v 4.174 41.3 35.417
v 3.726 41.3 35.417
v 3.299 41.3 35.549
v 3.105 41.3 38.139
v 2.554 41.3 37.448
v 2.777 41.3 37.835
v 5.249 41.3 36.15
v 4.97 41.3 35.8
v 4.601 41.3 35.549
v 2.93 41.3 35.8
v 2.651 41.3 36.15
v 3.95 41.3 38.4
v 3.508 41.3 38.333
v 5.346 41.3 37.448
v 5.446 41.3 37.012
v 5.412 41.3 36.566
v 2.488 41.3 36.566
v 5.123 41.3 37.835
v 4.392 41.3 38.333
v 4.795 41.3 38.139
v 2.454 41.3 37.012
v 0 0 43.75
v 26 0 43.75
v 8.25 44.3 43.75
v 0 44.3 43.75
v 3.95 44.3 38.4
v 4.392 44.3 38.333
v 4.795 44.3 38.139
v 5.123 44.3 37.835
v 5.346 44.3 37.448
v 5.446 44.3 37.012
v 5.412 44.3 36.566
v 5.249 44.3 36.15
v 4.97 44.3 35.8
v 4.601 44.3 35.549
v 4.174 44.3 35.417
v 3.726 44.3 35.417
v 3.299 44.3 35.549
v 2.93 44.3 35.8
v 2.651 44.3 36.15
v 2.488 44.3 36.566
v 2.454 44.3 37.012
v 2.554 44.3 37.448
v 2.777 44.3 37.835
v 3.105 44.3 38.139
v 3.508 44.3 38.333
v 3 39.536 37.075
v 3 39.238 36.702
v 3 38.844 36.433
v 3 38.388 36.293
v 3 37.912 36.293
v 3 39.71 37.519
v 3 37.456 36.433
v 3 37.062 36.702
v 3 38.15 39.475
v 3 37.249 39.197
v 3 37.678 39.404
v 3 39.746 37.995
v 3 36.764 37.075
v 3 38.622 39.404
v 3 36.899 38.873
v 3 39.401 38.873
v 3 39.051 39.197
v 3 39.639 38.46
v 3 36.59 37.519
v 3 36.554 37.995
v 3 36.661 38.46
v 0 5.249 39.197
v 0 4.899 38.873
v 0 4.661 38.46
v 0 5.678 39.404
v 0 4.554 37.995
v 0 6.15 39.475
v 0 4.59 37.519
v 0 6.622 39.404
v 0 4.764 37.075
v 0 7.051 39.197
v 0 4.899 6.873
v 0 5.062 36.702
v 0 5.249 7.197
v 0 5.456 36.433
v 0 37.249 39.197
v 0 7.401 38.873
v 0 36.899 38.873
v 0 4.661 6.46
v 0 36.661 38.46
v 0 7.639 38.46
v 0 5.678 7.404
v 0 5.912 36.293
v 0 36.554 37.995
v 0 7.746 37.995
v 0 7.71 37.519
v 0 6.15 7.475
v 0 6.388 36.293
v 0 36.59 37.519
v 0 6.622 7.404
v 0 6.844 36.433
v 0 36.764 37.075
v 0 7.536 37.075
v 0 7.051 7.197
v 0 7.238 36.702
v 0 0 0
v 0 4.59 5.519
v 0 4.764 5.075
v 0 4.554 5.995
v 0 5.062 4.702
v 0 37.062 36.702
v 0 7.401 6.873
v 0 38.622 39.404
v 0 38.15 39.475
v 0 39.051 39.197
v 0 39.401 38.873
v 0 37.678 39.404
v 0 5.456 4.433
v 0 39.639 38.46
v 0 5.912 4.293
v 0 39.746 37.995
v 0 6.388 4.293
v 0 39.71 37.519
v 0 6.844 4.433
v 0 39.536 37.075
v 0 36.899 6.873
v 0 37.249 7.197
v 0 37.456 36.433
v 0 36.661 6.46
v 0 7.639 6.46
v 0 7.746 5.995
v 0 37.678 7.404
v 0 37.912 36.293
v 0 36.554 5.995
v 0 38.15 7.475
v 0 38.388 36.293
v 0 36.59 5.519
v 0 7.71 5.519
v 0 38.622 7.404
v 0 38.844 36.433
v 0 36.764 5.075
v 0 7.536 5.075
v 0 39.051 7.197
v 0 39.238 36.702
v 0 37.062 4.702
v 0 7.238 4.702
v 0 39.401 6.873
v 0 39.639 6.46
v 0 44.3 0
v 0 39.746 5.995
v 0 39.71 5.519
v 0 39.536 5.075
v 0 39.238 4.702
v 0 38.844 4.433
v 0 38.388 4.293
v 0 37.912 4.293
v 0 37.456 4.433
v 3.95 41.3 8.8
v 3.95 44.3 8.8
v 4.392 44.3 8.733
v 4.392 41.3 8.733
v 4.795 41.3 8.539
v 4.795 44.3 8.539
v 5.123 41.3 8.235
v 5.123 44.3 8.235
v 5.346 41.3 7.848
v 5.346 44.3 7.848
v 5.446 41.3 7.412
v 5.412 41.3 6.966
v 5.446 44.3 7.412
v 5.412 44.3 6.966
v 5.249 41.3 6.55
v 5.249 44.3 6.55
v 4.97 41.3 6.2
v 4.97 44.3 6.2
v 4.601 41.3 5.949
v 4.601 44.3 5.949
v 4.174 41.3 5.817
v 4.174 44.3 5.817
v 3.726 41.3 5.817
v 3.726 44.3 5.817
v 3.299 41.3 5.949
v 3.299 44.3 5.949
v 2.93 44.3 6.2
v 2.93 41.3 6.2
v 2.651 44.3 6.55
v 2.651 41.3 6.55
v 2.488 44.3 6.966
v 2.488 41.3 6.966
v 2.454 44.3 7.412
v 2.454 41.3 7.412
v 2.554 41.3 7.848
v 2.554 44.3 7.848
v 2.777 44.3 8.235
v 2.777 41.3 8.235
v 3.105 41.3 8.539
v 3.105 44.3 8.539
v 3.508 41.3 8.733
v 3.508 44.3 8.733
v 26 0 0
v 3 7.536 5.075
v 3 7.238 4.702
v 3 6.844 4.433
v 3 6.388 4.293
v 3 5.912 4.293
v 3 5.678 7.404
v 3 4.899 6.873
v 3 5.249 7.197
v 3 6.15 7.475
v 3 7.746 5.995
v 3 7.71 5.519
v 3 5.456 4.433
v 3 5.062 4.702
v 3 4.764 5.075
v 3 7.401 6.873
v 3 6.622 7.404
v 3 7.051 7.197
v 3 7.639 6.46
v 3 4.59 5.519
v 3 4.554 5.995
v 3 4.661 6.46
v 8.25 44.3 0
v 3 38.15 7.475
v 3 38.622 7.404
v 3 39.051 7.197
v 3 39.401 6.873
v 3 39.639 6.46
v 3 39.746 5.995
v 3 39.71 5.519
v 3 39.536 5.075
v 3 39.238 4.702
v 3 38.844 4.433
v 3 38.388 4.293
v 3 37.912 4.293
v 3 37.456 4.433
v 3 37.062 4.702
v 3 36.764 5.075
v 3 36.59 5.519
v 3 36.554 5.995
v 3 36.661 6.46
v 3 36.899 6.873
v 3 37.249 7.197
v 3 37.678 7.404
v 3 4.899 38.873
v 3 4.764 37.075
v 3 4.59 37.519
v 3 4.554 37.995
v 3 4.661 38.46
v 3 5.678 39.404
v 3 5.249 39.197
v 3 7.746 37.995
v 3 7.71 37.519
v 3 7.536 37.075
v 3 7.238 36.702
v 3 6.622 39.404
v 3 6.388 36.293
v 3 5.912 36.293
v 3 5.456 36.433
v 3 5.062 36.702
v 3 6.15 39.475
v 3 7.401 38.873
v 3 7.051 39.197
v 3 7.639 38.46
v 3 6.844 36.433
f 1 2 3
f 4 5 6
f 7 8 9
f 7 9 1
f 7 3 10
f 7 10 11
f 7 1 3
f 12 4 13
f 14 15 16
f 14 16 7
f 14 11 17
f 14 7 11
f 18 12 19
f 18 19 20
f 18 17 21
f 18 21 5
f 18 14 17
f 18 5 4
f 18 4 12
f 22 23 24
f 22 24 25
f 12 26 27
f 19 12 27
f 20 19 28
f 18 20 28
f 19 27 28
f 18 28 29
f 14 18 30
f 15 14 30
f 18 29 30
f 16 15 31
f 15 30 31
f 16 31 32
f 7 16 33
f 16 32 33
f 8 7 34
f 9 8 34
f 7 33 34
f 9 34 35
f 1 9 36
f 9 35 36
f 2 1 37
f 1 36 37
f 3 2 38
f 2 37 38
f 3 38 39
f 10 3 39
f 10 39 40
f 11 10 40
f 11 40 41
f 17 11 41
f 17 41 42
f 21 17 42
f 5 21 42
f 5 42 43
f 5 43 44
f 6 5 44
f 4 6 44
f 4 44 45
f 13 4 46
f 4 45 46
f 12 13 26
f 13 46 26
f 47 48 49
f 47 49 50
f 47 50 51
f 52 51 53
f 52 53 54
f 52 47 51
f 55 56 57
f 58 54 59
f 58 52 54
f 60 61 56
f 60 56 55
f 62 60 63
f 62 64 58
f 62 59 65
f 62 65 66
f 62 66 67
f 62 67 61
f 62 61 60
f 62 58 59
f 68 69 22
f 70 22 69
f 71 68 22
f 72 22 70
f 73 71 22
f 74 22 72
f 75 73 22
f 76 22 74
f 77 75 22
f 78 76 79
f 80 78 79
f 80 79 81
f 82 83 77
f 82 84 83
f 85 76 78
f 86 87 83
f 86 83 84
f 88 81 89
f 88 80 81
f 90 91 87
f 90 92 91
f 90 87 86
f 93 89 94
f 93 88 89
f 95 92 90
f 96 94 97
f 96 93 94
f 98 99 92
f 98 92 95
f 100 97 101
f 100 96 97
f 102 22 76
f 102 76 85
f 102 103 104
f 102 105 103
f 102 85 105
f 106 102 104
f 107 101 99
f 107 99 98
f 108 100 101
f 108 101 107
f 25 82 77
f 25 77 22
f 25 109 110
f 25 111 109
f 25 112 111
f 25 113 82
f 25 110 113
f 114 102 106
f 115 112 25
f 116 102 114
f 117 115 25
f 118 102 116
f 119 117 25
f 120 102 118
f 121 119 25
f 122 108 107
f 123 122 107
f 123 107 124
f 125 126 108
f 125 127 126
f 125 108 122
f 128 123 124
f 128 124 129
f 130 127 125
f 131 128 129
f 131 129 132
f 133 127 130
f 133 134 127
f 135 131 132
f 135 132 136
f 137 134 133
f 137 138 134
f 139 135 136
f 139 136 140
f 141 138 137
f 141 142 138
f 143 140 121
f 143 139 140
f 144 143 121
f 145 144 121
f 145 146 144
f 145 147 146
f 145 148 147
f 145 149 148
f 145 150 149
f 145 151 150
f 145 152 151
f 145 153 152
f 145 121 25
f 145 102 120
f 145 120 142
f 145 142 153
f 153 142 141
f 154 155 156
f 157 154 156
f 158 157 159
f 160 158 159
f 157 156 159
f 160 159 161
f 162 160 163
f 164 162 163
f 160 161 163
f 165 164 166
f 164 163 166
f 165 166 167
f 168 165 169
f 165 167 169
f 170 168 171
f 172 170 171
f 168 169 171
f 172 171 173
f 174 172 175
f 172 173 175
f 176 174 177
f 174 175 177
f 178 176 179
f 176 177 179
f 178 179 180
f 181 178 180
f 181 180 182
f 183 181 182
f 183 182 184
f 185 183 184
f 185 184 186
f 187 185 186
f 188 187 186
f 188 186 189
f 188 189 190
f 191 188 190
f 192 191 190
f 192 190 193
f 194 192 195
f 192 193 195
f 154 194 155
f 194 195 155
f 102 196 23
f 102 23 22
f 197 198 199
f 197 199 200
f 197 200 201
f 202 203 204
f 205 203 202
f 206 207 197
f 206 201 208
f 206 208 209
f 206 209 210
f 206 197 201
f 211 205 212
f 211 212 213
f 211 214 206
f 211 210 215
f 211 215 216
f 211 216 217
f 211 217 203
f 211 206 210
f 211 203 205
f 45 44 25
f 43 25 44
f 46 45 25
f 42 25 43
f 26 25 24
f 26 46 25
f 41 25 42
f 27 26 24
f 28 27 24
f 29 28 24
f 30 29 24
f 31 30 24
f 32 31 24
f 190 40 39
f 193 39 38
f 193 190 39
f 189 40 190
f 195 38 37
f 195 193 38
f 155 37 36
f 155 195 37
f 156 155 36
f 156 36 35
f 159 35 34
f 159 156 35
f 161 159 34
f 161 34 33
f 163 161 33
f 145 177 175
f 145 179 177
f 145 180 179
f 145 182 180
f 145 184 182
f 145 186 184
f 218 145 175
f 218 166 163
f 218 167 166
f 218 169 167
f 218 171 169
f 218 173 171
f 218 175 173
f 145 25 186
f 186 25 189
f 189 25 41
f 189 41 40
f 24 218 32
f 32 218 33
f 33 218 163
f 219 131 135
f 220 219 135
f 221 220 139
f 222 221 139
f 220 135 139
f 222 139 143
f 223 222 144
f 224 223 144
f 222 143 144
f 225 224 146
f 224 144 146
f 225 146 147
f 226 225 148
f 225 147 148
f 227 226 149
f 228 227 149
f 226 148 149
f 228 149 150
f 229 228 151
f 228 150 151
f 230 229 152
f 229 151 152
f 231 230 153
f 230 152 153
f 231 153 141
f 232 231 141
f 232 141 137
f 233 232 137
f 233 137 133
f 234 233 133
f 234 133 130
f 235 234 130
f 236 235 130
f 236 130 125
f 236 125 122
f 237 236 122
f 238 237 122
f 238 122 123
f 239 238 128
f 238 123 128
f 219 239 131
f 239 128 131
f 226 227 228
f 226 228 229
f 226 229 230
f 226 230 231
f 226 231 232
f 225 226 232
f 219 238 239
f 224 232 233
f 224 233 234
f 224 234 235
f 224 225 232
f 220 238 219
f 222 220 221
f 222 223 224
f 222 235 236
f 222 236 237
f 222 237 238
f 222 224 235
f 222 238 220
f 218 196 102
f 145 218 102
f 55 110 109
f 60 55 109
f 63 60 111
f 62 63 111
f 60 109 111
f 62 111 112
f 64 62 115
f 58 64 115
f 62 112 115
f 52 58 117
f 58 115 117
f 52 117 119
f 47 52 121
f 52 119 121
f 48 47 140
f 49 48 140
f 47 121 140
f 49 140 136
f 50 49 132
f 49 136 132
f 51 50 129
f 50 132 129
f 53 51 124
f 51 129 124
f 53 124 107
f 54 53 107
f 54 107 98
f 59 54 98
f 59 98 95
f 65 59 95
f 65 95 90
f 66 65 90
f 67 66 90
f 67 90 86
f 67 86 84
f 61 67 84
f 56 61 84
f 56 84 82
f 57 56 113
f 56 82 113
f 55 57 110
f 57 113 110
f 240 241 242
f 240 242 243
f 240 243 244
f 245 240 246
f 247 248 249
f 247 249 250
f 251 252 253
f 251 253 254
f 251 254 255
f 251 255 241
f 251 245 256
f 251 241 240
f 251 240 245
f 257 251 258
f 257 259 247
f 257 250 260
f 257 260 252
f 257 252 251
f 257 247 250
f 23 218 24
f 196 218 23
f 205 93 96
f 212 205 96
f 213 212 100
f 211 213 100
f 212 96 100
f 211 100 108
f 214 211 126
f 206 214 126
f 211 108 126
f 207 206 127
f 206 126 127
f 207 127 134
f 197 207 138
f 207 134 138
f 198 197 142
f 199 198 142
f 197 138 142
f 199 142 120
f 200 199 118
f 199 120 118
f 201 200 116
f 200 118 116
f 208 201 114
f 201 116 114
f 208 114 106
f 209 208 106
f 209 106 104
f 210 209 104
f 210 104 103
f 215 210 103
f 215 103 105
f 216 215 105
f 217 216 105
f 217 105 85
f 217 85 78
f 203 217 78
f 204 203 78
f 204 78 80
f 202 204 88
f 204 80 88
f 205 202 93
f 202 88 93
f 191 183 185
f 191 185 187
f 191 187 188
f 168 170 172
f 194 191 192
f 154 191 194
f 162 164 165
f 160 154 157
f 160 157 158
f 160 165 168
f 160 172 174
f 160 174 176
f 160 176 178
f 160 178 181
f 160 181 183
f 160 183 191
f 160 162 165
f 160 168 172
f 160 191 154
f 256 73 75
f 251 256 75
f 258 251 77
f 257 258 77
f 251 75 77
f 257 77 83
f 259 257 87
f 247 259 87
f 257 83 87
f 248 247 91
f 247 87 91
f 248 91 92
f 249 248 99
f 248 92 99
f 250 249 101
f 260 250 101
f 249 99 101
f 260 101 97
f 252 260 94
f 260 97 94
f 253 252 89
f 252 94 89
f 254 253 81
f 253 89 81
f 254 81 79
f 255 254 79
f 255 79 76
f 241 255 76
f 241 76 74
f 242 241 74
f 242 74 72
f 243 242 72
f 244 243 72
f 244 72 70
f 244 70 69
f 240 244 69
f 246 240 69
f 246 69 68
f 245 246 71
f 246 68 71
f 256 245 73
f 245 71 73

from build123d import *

# Parameters (mm, degrees)
BOSS_EXTRUDE1_DEPTH = 43.75
SKETCH2_R           = 1.6
CUT_EXTRUDE1_DEPTH  = 3
SKETCH3_R           = 1.5
CUT_EXTRUDE2_DEPTH  = 3


with BuildPart() as part:
    # Sketch1 → Boss-Extrude1 (new body)
    with BuildSketch(Plane.XY):
        Polygon((0, 0), (0, 44.3), (8.25, 44.3), (26, 0), align=None)
    extrude(amount=BOSS_EXTRUDE1_DEPTH)

    # Sketch2 → Cut-Extrude1 (cut)
    with BuildSketch(Plane.ZY):
        with Locations((5.875, 38.15)):
            Circle(SKETCH2_R)
        with Locations((37.875, 38.15)):
            Circle(SKETCH2_R)
        with Locations((5.875, 6.15)):
            Circle(SKETCH2_R)
        with Locations((37.875, 6.15)):
            Circle(SKETCH2_R)
    extrude(amount=-CUT_EXTRUDE1_DEPTH, mode=Mode.SUBTRACT)

    # Sketch3 → Cut-Extrude2 (cut)
    with BuildSketch(Plane(origin=(0, 44.3, 0), x_dir=(1, 0, 0), z_dir=(0, 1, 0))):
        with Locations(Location((3.95, -7.3, 0), (0, 0, 270))):
            Circle(SKETCH3_R)
        with Locations(Location((3.95, -36.9, 0), (0, 0, 270))):
            Circle(SKETCH3_R)
    extrude(amount=-CUT_EXTRUDE2_DEPTH, mode=Mode.SUBTRACT)


solid = part.part
